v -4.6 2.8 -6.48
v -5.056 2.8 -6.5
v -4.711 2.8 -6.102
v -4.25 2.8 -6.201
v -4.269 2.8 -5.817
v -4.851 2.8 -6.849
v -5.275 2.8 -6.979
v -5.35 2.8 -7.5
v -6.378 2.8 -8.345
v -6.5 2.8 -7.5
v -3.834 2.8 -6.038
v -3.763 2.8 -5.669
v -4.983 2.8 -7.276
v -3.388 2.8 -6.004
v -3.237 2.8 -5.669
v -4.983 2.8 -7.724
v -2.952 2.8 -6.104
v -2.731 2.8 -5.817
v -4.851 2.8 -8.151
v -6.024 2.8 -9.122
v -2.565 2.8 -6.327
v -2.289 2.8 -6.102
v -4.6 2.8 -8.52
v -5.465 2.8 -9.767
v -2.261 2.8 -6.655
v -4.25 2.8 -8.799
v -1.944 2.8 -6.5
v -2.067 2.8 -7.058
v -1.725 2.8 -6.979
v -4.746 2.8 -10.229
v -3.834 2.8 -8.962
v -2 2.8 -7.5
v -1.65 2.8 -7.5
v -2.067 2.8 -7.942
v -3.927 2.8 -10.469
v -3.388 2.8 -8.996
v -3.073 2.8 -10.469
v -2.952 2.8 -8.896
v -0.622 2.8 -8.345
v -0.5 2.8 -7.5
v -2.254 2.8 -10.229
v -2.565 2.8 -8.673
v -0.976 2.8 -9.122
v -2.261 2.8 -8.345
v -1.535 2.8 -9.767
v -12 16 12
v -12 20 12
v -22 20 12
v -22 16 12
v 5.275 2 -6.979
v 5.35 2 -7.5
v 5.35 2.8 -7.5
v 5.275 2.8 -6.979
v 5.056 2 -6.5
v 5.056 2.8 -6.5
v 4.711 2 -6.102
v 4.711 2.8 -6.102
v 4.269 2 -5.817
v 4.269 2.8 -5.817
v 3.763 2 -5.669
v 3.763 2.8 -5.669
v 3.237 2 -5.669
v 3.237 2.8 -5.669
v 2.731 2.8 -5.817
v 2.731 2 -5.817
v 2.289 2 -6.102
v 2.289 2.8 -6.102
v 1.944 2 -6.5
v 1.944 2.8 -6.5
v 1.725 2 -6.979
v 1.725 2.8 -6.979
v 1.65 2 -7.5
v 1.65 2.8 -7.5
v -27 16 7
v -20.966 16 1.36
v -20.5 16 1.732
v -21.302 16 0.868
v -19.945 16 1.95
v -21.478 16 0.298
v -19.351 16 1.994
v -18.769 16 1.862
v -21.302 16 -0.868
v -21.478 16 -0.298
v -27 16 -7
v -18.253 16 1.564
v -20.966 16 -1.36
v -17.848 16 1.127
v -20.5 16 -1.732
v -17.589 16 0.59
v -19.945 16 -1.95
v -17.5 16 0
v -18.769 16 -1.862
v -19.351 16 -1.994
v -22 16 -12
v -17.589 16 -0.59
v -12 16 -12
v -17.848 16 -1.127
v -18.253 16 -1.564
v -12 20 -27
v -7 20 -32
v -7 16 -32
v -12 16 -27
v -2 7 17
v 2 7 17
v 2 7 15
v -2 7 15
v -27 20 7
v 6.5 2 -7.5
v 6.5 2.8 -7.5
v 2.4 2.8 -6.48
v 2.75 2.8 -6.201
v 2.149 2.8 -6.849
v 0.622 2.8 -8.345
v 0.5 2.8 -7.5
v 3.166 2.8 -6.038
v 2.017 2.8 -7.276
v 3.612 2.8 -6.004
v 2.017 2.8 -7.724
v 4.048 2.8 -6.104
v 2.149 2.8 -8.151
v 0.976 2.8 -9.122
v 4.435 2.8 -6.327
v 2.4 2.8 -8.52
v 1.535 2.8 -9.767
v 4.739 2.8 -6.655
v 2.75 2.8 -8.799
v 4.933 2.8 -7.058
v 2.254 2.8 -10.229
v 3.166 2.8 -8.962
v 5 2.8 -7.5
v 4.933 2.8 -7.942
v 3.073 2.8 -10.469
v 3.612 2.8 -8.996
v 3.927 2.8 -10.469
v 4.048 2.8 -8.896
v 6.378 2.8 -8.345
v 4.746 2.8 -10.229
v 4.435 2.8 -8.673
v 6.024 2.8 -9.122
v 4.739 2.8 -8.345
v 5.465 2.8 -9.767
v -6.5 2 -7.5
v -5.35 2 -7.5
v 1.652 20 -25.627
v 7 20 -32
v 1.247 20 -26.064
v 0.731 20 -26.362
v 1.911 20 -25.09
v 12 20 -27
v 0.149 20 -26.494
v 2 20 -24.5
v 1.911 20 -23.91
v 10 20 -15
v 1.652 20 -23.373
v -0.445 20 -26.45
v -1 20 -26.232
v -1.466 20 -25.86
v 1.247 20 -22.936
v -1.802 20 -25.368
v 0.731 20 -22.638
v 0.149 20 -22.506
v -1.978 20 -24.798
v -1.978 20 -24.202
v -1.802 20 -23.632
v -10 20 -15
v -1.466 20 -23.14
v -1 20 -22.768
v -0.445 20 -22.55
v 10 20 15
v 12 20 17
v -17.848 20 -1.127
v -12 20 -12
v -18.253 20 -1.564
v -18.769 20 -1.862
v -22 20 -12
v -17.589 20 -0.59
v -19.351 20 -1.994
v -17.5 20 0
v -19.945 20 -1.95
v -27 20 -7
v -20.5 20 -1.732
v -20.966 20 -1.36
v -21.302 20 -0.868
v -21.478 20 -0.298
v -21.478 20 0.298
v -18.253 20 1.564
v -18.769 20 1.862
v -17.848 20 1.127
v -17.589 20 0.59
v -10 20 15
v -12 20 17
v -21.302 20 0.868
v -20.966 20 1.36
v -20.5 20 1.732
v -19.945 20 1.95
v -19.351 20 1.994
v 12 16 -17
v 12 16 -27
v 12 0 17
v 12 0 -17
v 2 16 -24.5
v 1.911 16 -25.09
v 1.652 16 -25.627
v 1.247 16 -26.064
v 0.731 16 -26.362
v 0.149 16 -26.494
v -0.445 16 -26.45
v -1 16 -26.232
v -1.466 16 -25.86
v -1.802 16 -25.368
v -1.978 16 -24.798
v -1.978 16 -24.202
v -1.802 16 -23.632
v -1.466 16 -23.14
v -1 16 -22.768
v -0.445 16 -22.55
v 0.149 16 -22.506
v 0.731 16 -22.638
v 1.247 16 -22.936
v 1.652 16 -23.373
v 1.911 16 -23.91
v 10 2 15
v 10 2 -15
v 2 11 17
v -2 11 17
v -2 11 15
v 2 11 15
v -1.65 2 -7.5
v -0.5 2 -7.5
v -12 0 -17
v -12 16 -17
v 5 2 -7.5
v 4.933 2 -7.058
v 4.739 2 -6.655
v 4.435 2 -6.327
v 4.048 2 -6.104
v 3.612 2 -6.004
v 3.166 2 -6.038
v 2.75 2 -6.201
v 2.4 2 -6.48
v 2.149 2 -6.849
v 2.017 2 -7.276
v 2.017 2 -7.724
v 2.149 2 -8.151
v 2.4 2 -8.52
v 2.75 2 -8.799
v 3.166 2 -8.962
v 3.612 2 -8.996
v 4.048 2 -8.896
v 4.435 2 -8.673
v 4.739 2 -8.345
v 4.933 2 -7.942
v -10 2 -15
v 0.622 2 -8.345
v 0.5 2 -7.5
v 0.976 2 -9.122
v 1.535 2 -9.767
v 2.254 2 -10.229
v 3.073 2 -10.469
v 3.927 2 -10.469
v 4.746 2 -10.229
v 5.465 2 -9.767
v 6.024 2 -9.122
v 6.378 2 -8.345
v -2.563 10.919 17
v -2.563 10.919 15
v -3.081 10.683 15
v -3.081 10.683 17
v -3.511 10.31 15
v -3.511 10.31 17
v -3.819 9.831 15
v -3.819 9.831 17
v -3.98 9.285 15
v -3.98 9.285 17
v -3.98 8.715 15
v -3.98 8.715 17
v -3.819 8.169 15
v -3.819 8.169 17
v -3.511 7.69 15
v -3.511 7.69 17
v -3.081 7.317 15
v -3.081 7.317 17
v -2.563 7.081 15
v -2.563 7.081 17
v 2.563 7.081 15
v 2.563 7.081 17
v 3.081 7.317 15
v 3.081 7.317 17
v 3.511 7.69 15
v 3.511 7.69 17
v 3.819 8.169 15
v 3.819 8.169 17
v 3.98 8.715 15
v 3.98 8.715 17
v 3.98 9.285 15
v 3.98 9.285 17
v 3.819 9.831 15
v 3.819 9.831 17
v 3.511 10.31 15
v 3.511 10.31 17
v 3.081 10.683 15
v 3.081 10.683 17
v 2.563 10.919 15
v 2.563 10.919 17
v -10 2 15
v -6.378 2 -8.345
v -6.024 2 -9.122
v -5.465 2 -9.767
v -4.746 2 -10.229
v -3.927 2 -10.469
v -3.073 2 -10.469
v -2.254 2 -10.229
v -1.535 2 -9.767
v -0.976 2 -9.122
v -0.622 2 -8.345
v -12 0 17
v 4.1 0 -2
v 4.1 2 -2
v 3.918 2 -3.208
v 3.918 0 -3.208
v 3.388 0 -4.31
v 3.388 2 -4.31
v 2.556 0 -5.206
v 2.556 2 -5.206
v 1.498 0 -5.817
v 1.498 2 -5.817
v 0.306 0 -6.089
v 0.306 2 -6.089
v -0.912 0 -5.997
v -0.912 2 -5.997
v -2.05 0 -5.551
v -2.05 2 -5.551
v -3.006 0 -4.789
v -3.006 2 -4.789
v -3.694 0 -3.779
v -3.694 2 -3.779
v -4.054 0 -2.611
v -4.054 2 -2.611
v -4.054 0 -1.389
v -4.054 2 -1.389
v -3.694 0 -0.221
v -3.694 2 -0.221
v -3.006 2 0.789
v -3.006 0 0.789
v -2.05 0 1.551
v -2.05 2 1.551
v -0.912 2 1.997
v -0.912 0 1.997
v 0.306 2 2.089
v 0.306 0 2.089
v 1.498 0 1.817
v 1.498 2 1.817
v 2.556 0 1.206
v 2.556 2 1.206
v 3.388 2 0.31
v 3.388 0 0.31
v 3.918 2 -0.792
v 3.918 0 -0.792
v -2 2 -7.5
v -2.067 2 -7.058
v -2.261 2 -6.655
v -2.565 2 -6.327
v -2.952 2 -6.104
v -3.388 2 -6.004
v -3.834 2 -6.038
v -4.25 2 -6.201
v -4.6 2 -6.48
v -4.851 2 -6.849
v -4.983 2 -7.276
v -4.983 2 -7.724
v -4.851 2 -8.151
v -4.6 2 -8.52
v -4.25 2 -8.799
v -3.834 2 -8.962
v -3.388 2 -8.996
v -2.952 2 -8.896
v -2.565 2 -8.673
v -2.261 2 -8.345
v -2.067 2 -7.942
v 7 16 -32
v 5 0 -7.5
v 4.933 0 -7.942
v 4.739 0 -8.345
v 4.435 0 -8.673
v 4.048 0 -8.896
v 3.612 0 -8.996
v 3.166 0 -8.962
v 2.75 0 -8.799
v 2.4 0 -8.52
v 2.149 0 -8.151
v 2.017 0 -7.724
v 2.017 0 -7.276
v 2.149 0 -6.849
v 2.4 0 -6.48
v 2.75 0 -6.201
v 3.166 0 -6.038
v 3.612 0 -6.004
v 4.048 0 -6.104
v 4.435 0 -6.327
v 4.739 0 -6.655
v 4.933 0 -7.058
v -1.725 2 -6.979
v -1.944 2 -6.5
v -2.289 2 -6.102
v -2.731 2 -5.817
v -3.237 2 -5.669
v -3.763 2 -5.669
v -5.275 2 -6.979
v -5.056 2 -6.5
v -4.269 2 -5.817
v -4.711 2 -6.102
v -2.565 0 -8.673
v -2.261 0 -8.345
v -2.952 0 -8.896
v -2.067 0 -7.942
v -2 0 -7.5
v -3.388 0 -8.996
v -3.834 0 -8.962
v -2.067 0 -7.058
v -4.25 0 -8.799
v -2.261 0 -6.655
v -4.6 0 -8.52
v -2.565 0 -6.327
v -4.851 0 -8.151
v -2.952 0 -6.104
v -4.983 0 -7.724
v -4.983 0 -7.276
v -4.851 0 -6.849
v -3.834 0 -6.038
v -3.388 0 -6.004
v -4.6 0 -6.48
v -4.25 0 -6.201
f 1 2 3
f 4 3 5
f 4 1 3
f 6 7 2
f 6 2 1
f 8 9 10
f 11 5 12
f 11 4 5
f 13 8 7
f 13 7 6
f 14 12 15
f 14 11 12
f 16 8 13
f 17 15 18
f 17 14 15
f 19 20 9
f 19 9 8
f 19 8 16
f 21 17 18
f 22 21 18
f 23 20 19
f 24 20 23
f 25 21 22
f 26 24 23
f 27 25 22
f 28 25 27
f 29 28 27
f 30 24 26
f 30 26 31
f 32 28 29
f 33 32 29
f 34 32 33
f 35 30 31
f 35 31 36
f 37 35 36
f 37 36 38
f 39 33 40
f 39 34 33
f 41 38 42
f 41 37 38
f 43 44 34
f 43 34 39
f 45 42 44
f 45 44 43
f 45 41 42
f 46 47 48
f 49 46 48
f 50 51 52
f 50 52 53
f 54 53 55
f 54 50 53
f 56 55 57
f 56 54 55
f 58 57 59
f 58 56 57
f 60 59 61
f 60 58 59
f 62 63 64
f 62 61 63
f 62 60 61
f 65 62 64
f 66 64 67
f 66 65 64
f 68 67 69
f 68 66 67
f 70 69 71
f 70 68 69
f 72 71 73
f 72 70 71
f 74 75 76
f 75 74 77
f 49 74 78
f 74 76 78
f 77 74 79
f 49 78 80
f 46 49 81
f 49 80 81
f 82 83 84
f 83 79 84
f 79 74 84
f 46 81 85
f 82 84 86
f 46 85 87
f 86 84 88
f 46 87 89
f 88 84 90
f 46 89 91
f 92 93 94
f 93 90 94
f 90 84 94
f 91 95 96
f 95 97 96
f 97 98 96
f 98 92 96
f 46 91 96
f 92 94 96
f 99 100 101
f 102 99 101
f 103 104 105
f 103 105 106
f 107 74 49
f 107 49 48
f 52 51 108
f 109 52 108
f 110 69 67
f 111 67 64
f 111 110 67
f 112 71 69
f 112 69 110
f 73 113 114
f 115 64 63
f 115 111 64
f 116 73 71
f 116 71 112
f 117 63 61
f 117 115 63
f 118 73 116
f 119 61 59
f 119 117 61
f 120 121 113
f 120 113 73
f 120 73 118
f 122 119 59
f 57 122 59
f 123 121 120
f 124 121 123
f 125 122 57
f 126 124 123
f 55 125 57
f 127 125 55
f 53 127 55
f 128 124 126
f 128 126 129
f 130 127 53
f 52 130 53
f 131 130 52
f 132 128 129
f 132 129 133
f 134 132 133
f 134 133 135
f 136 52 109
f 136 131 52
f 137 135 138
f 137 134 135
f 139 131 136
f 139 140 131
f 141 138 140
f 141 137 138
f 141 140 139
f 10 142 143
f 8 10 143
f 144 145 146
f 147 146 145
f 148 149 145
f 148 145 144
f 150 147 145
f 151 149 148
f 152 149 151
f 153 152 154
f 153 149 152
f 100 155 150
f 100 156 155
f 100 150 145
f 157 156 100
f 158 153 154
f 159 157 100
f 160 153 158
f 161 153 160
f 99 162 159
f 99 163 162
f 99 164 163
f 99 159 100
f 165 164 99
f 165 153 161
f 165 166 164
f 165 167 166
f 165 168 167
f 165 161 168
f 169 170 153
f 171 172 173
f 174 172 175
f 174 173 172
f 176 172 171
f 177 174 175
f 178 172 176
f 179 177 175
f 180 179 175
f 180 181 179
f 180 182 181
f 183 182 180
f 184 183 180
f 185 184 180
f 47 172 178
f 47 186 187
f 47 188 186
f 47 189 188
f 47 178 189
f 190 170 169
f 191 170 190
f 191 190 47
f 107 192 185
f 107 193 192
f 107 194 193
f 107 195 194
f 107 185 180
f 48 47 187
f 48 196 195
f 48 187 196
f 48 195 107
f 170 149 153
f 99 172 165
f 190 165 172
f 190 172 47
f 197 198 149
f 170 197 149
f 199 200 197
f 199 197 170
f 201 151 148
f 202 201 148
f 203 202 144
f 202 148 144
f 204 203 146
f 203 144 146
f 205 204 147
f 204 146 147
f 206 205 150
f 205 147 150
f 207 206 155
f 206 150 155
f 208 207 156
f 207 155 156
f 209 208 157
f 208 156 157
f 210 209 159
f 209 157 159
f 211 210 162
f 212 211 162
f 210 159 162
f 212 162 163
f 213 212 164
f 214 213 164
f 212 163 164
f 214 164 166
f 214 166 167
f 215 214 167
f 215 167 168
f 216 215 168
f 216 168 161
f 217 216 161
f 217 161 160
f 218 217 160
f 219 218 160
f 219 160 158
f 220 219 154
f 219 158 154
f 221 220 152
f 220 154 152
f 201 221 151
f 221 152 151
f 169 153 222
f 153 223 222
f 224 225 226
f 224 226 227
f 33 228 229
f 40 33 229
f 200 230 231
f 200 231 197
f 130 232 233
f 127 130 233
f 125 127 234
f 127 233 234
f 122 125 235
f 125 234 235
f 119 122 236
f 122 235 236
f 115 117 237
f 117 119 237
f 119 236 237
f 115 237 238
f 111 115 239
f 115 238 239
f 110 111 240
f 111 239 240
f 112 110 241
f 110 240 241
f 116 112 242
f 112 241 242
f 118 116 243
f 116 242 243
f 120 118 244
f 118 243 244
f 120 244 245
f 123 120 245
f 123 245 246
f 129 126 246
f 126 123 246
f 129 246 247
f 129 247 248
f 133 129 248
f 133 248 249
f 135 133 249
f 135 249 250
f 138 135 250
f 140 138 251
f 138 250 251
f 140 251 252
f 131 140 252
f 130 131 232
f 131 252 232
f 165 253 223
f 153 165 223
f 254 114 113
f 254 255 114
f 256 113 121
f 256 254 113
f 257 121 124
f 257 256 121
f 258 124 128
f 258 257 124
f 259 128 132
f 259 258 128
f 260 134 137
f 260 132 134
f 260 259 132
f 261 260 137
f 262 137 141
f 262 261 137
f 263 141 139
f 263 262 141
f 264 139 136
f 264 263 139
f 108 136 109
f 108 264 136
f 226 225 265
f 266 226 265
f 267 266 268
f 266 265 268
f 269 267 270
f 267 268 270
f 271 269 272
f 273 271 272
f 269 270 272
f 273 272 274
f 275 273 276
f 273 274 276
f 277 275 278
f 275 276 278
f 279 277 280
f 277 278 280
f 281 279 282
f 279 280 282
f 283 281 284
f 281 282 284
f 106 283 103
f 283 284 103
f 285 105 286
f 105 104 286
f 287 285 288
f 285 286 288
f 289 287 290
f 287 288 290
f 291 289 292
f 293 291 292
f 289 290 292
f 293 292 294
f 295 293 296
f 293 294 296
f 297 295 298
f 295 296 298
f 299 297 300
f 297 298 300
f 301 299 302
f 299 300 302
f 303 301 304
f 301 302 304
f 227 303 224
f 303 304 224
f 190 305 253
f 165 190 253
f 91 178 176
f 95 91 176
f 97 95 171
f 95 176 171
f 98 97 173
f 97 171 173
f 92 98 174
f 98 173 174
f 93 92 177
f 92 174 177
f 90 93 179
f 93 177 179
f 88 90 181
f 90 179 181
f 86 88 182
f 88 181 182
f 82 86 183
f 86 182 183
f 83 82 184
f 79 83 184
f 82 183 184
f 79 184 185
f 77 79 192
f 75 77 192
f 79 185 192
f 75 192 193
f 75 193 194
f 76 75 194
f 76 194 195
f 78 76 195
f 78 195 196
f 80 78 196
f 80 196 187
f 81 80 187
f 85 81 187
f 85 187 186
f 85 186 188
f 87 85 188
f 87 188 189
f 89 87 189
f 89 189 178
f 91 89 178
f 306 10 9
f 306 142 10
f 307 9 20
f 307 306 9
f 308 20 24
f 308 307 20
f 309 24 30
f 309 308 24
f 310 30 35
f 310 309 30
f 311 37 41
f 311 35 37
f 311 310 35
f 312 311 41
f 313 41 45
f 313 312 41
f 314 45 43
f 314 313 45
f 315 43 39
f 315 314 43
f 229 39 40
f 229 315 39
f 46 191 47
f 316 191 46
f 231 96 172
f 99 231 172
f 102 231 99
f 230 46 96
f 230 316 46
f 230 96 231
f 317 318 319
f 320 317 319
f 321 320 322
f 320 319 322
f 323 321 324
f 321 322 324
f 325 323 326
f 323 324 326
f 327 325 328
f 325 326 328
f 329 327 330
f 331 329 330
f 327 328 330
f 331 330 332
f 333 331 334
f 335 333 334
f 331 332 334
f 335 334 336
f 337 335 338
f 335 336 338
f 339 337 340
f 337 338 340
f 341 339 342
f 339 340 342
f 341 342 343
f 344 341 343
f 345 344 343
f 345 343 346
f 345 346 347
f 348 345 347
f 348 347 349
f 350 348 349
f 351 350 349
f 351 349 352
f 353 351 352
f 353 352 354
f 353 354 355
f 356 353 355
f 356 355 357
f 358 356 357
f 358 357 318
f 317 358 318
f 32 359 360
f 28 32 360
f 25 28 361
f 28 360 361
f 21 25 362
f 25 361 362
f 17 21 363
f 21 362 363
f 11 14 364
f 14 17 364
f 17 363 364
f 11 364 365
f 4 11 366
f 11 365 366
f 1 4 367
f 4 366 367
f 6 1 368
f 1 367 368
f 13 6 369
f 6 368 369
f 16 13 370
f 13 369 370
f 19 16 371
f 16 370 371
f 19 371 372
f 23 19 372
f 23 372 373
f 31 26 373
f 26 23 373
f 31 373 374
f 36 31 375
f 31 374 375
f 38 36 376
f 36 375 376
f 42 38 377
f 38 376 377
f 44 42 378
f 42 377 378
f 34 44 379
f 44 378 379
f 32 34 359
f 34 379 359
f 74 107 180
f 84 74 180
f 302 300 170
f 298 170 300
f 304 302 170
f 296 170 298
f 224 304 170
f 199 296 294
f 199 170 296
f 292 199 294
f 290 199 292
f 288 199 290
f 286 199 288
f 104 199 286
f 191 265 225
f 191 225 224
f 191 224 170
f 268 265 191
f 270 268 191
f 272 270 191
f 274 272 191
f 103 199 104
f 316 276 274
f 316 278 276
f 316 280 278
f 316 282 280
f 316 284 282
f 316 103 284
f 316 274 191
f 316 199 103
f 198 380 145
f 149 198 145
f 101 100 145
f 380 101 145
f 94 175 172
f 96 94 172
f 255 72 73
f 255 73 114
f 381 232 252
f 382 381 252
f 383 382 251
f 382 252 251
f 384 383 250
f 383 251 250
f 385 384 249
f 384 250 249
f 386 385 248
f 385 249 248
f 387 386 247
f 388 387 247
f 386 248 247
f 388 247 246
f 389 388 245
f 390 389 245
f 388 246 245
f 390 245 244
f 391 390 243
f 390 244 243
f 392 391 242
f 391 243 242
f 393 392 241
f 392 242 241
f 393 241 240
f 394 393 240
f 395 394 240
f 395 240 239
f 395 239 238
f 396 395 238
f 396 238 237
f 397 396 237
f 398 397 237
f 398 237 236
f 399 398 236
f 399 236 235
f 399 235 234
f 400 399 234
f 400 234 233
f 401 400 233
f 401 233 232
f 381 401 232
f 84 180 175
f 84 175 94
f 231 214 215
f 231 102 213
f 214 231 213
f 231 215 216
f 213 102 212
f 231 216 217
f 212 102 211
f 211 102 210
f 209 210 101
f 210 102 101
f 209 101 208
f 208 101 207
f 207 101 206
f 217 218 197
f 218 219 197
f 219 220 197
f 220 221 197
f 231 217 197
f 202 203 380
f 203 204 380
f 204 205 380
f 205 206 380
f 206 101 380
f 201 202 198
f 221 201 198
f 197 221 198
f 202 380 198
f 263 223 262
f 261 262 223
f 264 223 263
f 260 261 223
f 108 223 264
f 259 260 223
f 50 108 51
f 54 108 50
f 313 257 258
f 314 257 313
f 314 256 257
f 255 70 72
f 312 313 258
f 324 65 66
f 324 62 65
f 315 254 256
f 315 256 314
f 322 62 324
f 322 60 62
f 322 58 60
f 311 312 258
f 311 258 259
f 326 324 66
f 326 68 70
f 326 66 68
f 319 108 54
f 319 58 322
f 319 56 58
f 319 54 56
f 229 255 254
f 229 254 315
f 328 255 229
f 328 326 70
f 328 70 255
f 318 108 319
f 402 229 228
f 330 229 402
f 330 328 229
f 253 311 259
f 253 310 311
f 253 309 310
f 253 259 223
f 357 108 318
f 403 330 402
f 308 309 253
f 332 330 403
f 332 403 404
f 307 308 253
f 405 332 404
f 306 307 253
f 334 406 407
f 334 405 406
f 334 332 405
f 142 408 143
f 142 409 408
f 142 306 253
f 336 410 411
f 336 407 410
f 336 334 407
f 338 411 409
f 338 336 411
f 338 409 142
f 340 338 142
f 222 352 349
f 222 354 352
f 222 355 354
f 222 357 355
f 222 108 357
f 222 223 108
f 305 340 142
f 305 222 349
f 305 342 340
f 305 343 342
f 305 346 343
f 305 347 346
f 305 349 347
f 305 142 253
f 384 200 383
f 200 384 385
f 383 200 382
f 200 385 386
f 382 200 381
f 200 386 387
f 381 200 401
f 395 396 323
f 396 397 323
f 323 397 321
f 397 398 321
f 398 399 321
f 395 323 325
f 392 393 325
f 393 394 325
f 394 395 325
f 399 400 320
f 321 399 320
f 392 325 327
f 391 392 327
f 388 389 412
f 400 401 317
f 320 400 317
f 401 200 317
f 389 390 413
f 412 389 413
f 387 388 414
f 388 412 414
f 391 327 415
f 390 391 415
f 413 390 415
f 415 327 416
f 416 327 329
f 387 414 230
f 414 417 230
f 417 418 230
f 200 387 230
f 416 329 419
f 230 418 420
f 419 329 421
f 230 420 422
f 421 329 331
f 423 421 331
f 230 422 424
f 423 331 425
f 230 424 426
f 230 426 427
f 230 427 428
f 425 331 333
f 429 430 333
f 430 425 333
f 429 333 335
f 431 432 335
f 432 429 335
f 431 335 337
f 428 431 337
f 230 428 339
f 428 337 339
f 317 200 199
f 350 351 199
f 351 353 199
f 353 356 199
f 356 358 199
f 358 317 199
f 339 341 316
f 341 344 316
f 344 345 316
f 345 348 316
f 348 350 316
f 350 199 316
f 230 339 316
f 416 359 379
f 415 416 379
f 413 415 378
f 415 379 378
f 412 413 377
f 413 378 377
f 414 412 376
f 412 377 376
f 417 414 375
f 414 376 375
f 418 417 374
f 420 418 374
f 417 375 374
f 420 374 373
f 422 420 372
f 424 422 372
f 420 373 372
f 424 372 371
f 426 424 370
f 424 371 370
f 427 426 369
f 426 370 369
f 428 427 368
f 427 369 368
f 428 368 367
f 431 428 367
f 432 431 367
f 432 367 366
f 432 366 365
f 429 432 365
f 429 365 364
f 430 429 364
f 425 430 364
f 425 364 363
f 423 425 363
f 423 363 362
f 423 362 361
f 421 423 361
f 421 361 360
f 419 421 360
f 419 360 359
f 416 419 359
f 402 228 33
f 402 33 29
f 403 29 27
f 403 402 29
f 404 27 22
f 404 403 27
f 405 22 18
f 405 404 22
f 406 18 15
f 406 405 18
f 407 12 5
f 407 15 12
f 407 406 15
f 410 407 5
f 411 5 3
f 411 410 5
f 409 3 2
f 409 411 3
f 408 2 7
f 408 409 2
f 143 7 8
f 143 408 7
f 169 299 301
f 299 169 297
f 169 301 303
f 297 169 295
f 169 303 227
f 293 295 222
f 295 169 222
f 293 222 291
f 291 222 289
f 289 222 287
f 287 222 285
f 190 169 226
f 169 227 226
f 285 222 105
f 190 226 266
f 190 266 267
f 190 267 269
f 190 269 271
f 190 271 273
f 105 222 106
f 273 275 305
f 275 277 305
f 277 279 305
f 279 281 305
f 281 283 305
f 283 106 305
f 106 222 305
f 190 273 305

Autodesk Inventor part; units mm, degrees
ref_plane "YZ Plane" through (0, 0, 0) normal (1, 0, 0) x (0, 1, 0)
ref_plane "XZ Plane" through (0, 0, 0) normal (0, 1, 0) x (-1, 0, 0)
ref_plane "XY Plane" through (0, 0, 0) normal (0, 0, 1) x (1, 0, 0)
sketch "Esboço1" plane through (0, 0, 0) normal (0, 1, 0) x (-1, 0, 0)
  line L0 (-12, 17) -> (12, 17)
  line L1 (12, 17) -> (12, -17)
  line L2 (12, -17) -> (-12, -17)
  line L3 (-12, -17) -> (-12, 17)
  line L4 (-12, 17) -> (12, -17) construction
  line L5 (12, 17) -> (-12, -17) construction
  point P0 (0, 0)
  dimension "d0" = 24
  dimension "d1" = 34
extrude "Extrusão1" add sketch "Esboço1" along normal blind 20
shell "Casca1" thickness 2 removed faces 1 at (4, 20, 5.6667)
sketch "Esboço2" plane through (-10, 2, 15) normal (0, 1, 0) x (1, 0, 0)
  line L0 (16, 8) -> (4, 8)
  line L1 (4, 8) -> (4, 25)
  line L2 (4, 25) -> (16, 25)
  line L3 (16, 25) -> (16, 8)
  line L4 (16, 8) -> (4, 25) construction
  line L5 (4, 8) -> (16, 25) construction
  line L6 (0, 30) -> (20, 30) projected
  circle A0 centre (6.5, 22.5) radius 1.5
  circle A1 centre (13.5, 22.5) radius 1.5
  point P0 (10, 15)
  point P1 (10, 16.5)
  dimension "d5" = 12
  dimension "d6" = 17
  dimension "d7" = 5
  dimension "d8" = 3
  dimension "d9" = 2.5
  dimension "d10" = 2.5
  dimension "d11" = 3
  dimension "d12" = 2.5
extrude "Extrusão2" cut sketch "Esboço2" against normal blind 30 contours A0 | A1
sketch "Esboço5" plane through (-10, 2, 15) normal (0, 1, 0) x (1, 0, 0)
  circle A0 centre (13.5, 22.5) radius 1.5 projected
  arc A1 (11.65, 22.5) -> (15.35, 22.5) centre (13.5, 22.5) ccw
  circle A2 centre (13.5, 22.5) radius 1.5
  circle A3 centre (6.5, 22.5) radius 1.5 projected
  circle A4 centre (6.5, 22.5) radius 1.5
  arc A5 (4.65, 22.5) -> (8.35, 22.5) centre (6.5, 22.5) ccw
  arc A6 (16.5, 22.5) -> (10.5, 22.5) centre (13.5, 22.5) ccw
  arc A7 (9.5, 22.5) -> (3.5, 22.5) centre (6.5, 22.5) ccw
  line L0 (15.35, 22.5) -> (16.5, 22.5)
  line L1 (11.65, 22.5) -> (10.5, 22.5)
  line L2 (8.35, 22.5) -> (9.5, 22.5)
  line L3 (3.5, 22.5) -> (4.65, 22.5)
  point P0 (10, 15)
  dimension "d32" = 3.7
  dimension "d33" = 3.7
  dimension "d34" = 6
  dimension "d35" = 6
extrude "Extrusão5" add sketch "Esboço5" along normal blind 0.8
sketch "Esboço6" plane through (-10, 2, 15) normal (0, 1, 0) x (1, 0, 0)
  circle A0 centre (10, 17) radius 4.1
  line L0 (16, 8) -> (4, 8)
  line L1 (4, 8) -> (4, 25)
  line L2 (4, 25) -> (16, 25)
  line L3 (16, 25) -> (16, 8)
  line L4 (16, 8) -> (4, 25) construction
  line L5 (4, 8) -> (16, 25) construction
  line L6 (0, 30) -> (20, 30) projected
  point P0 (10, 15)
  point P1 (10, 16.5)
  dimension "d38" = 8.2
  dimension "d39" = 12
  dimension "d40" = 17
  dimension "d41" = 5
  dimension "d42" = 9
extrude "Extrusão6" cut sketch "Esboço6" against normal blind 2 contours A0
sketch "Esboço8" plane through (0, 20, 0) normal (0, 1, 0) x (1, 0, 0)
  line L0 (-12, 17) -> (12, 17) projected
  line L1 (12, 17) -> (-12, 17)
  line L2 (-12, 17) -> (-12, 32)
  line L3 (-12, 32) -> (12, 32)
  line L4 (12, 32) -> (12, 17)
  line L5 (-12, -17) -> (-12, 17) projected
  line L6 (-12, -12) -> (-27, -12)
  line L7 (-27, -12) -> (-27, 12)
  line L8 (-27, 12) -> (-12, 12)
  line L9 (-12, 12) -> (-12, -12)
  point P0 (0, 0)
  dimension "d57" = 15
  dimension "d58" = 15
  dimension "d59" = 24
  dimension "d60" = 5
extrude "Extrusão8" add sketch "Esboço8" against normal blind 4
chamfer "Chanfro3" distance 5 angle 45 4 edges at (-27, 18, -12) (-12, 18, -32) (12, 18, -32) (-27, 18, 12)
sketch "Esboço9" plane through (0, 20, 0) normal (0, 1, 0) x (1, 0, 0)
  circle A0 centre (-19.5, 0) radius 2
  circle A1 centre (0, 24.5) radius 2
  line L0 (-27, 7) -> (-27, -7) projected
  line L1 (7, 32) -> (-7, 32) projected
  point P0 (0, 0)
  dimension "d66" = 4
  dimension "d67" = 4
  dimension "d68" = 7.5
  dimension "d69" = 7.5
extrude "Extrusão9" cut sketch "Esboço9" against normal blind 4
sketch "Esboço11" plane through (-12, 0, 17) normal (0, 0, 1) x (1, 0, 0)
  arc A0 (10, 11) -> (10, 7) centre (10, 9) ccw
  line L0 (24, 0) -> (0, 0) projected
  line L1 (0, 0) -> (0, 20) projected
  arc A1 (14, 7) -> (14, 11) centre (14, 9) ccw
  line L2 (24, 0) -> (24, 20) projected
  line L3 (10, 11) -> (14, 11)
  line L4 (14, 7) -> (10, 7)
  point P0 (12, 0)
  dimension "d79" = 4
  dimension "d80" = 9
  dimension "d81" = 10
  dimension "d82" = 4
  dimension "d83" = 10
extrude "Extrusão11" cut sketch "Esboço11" against normal blind 4
properties part number "Caixa mlx"
